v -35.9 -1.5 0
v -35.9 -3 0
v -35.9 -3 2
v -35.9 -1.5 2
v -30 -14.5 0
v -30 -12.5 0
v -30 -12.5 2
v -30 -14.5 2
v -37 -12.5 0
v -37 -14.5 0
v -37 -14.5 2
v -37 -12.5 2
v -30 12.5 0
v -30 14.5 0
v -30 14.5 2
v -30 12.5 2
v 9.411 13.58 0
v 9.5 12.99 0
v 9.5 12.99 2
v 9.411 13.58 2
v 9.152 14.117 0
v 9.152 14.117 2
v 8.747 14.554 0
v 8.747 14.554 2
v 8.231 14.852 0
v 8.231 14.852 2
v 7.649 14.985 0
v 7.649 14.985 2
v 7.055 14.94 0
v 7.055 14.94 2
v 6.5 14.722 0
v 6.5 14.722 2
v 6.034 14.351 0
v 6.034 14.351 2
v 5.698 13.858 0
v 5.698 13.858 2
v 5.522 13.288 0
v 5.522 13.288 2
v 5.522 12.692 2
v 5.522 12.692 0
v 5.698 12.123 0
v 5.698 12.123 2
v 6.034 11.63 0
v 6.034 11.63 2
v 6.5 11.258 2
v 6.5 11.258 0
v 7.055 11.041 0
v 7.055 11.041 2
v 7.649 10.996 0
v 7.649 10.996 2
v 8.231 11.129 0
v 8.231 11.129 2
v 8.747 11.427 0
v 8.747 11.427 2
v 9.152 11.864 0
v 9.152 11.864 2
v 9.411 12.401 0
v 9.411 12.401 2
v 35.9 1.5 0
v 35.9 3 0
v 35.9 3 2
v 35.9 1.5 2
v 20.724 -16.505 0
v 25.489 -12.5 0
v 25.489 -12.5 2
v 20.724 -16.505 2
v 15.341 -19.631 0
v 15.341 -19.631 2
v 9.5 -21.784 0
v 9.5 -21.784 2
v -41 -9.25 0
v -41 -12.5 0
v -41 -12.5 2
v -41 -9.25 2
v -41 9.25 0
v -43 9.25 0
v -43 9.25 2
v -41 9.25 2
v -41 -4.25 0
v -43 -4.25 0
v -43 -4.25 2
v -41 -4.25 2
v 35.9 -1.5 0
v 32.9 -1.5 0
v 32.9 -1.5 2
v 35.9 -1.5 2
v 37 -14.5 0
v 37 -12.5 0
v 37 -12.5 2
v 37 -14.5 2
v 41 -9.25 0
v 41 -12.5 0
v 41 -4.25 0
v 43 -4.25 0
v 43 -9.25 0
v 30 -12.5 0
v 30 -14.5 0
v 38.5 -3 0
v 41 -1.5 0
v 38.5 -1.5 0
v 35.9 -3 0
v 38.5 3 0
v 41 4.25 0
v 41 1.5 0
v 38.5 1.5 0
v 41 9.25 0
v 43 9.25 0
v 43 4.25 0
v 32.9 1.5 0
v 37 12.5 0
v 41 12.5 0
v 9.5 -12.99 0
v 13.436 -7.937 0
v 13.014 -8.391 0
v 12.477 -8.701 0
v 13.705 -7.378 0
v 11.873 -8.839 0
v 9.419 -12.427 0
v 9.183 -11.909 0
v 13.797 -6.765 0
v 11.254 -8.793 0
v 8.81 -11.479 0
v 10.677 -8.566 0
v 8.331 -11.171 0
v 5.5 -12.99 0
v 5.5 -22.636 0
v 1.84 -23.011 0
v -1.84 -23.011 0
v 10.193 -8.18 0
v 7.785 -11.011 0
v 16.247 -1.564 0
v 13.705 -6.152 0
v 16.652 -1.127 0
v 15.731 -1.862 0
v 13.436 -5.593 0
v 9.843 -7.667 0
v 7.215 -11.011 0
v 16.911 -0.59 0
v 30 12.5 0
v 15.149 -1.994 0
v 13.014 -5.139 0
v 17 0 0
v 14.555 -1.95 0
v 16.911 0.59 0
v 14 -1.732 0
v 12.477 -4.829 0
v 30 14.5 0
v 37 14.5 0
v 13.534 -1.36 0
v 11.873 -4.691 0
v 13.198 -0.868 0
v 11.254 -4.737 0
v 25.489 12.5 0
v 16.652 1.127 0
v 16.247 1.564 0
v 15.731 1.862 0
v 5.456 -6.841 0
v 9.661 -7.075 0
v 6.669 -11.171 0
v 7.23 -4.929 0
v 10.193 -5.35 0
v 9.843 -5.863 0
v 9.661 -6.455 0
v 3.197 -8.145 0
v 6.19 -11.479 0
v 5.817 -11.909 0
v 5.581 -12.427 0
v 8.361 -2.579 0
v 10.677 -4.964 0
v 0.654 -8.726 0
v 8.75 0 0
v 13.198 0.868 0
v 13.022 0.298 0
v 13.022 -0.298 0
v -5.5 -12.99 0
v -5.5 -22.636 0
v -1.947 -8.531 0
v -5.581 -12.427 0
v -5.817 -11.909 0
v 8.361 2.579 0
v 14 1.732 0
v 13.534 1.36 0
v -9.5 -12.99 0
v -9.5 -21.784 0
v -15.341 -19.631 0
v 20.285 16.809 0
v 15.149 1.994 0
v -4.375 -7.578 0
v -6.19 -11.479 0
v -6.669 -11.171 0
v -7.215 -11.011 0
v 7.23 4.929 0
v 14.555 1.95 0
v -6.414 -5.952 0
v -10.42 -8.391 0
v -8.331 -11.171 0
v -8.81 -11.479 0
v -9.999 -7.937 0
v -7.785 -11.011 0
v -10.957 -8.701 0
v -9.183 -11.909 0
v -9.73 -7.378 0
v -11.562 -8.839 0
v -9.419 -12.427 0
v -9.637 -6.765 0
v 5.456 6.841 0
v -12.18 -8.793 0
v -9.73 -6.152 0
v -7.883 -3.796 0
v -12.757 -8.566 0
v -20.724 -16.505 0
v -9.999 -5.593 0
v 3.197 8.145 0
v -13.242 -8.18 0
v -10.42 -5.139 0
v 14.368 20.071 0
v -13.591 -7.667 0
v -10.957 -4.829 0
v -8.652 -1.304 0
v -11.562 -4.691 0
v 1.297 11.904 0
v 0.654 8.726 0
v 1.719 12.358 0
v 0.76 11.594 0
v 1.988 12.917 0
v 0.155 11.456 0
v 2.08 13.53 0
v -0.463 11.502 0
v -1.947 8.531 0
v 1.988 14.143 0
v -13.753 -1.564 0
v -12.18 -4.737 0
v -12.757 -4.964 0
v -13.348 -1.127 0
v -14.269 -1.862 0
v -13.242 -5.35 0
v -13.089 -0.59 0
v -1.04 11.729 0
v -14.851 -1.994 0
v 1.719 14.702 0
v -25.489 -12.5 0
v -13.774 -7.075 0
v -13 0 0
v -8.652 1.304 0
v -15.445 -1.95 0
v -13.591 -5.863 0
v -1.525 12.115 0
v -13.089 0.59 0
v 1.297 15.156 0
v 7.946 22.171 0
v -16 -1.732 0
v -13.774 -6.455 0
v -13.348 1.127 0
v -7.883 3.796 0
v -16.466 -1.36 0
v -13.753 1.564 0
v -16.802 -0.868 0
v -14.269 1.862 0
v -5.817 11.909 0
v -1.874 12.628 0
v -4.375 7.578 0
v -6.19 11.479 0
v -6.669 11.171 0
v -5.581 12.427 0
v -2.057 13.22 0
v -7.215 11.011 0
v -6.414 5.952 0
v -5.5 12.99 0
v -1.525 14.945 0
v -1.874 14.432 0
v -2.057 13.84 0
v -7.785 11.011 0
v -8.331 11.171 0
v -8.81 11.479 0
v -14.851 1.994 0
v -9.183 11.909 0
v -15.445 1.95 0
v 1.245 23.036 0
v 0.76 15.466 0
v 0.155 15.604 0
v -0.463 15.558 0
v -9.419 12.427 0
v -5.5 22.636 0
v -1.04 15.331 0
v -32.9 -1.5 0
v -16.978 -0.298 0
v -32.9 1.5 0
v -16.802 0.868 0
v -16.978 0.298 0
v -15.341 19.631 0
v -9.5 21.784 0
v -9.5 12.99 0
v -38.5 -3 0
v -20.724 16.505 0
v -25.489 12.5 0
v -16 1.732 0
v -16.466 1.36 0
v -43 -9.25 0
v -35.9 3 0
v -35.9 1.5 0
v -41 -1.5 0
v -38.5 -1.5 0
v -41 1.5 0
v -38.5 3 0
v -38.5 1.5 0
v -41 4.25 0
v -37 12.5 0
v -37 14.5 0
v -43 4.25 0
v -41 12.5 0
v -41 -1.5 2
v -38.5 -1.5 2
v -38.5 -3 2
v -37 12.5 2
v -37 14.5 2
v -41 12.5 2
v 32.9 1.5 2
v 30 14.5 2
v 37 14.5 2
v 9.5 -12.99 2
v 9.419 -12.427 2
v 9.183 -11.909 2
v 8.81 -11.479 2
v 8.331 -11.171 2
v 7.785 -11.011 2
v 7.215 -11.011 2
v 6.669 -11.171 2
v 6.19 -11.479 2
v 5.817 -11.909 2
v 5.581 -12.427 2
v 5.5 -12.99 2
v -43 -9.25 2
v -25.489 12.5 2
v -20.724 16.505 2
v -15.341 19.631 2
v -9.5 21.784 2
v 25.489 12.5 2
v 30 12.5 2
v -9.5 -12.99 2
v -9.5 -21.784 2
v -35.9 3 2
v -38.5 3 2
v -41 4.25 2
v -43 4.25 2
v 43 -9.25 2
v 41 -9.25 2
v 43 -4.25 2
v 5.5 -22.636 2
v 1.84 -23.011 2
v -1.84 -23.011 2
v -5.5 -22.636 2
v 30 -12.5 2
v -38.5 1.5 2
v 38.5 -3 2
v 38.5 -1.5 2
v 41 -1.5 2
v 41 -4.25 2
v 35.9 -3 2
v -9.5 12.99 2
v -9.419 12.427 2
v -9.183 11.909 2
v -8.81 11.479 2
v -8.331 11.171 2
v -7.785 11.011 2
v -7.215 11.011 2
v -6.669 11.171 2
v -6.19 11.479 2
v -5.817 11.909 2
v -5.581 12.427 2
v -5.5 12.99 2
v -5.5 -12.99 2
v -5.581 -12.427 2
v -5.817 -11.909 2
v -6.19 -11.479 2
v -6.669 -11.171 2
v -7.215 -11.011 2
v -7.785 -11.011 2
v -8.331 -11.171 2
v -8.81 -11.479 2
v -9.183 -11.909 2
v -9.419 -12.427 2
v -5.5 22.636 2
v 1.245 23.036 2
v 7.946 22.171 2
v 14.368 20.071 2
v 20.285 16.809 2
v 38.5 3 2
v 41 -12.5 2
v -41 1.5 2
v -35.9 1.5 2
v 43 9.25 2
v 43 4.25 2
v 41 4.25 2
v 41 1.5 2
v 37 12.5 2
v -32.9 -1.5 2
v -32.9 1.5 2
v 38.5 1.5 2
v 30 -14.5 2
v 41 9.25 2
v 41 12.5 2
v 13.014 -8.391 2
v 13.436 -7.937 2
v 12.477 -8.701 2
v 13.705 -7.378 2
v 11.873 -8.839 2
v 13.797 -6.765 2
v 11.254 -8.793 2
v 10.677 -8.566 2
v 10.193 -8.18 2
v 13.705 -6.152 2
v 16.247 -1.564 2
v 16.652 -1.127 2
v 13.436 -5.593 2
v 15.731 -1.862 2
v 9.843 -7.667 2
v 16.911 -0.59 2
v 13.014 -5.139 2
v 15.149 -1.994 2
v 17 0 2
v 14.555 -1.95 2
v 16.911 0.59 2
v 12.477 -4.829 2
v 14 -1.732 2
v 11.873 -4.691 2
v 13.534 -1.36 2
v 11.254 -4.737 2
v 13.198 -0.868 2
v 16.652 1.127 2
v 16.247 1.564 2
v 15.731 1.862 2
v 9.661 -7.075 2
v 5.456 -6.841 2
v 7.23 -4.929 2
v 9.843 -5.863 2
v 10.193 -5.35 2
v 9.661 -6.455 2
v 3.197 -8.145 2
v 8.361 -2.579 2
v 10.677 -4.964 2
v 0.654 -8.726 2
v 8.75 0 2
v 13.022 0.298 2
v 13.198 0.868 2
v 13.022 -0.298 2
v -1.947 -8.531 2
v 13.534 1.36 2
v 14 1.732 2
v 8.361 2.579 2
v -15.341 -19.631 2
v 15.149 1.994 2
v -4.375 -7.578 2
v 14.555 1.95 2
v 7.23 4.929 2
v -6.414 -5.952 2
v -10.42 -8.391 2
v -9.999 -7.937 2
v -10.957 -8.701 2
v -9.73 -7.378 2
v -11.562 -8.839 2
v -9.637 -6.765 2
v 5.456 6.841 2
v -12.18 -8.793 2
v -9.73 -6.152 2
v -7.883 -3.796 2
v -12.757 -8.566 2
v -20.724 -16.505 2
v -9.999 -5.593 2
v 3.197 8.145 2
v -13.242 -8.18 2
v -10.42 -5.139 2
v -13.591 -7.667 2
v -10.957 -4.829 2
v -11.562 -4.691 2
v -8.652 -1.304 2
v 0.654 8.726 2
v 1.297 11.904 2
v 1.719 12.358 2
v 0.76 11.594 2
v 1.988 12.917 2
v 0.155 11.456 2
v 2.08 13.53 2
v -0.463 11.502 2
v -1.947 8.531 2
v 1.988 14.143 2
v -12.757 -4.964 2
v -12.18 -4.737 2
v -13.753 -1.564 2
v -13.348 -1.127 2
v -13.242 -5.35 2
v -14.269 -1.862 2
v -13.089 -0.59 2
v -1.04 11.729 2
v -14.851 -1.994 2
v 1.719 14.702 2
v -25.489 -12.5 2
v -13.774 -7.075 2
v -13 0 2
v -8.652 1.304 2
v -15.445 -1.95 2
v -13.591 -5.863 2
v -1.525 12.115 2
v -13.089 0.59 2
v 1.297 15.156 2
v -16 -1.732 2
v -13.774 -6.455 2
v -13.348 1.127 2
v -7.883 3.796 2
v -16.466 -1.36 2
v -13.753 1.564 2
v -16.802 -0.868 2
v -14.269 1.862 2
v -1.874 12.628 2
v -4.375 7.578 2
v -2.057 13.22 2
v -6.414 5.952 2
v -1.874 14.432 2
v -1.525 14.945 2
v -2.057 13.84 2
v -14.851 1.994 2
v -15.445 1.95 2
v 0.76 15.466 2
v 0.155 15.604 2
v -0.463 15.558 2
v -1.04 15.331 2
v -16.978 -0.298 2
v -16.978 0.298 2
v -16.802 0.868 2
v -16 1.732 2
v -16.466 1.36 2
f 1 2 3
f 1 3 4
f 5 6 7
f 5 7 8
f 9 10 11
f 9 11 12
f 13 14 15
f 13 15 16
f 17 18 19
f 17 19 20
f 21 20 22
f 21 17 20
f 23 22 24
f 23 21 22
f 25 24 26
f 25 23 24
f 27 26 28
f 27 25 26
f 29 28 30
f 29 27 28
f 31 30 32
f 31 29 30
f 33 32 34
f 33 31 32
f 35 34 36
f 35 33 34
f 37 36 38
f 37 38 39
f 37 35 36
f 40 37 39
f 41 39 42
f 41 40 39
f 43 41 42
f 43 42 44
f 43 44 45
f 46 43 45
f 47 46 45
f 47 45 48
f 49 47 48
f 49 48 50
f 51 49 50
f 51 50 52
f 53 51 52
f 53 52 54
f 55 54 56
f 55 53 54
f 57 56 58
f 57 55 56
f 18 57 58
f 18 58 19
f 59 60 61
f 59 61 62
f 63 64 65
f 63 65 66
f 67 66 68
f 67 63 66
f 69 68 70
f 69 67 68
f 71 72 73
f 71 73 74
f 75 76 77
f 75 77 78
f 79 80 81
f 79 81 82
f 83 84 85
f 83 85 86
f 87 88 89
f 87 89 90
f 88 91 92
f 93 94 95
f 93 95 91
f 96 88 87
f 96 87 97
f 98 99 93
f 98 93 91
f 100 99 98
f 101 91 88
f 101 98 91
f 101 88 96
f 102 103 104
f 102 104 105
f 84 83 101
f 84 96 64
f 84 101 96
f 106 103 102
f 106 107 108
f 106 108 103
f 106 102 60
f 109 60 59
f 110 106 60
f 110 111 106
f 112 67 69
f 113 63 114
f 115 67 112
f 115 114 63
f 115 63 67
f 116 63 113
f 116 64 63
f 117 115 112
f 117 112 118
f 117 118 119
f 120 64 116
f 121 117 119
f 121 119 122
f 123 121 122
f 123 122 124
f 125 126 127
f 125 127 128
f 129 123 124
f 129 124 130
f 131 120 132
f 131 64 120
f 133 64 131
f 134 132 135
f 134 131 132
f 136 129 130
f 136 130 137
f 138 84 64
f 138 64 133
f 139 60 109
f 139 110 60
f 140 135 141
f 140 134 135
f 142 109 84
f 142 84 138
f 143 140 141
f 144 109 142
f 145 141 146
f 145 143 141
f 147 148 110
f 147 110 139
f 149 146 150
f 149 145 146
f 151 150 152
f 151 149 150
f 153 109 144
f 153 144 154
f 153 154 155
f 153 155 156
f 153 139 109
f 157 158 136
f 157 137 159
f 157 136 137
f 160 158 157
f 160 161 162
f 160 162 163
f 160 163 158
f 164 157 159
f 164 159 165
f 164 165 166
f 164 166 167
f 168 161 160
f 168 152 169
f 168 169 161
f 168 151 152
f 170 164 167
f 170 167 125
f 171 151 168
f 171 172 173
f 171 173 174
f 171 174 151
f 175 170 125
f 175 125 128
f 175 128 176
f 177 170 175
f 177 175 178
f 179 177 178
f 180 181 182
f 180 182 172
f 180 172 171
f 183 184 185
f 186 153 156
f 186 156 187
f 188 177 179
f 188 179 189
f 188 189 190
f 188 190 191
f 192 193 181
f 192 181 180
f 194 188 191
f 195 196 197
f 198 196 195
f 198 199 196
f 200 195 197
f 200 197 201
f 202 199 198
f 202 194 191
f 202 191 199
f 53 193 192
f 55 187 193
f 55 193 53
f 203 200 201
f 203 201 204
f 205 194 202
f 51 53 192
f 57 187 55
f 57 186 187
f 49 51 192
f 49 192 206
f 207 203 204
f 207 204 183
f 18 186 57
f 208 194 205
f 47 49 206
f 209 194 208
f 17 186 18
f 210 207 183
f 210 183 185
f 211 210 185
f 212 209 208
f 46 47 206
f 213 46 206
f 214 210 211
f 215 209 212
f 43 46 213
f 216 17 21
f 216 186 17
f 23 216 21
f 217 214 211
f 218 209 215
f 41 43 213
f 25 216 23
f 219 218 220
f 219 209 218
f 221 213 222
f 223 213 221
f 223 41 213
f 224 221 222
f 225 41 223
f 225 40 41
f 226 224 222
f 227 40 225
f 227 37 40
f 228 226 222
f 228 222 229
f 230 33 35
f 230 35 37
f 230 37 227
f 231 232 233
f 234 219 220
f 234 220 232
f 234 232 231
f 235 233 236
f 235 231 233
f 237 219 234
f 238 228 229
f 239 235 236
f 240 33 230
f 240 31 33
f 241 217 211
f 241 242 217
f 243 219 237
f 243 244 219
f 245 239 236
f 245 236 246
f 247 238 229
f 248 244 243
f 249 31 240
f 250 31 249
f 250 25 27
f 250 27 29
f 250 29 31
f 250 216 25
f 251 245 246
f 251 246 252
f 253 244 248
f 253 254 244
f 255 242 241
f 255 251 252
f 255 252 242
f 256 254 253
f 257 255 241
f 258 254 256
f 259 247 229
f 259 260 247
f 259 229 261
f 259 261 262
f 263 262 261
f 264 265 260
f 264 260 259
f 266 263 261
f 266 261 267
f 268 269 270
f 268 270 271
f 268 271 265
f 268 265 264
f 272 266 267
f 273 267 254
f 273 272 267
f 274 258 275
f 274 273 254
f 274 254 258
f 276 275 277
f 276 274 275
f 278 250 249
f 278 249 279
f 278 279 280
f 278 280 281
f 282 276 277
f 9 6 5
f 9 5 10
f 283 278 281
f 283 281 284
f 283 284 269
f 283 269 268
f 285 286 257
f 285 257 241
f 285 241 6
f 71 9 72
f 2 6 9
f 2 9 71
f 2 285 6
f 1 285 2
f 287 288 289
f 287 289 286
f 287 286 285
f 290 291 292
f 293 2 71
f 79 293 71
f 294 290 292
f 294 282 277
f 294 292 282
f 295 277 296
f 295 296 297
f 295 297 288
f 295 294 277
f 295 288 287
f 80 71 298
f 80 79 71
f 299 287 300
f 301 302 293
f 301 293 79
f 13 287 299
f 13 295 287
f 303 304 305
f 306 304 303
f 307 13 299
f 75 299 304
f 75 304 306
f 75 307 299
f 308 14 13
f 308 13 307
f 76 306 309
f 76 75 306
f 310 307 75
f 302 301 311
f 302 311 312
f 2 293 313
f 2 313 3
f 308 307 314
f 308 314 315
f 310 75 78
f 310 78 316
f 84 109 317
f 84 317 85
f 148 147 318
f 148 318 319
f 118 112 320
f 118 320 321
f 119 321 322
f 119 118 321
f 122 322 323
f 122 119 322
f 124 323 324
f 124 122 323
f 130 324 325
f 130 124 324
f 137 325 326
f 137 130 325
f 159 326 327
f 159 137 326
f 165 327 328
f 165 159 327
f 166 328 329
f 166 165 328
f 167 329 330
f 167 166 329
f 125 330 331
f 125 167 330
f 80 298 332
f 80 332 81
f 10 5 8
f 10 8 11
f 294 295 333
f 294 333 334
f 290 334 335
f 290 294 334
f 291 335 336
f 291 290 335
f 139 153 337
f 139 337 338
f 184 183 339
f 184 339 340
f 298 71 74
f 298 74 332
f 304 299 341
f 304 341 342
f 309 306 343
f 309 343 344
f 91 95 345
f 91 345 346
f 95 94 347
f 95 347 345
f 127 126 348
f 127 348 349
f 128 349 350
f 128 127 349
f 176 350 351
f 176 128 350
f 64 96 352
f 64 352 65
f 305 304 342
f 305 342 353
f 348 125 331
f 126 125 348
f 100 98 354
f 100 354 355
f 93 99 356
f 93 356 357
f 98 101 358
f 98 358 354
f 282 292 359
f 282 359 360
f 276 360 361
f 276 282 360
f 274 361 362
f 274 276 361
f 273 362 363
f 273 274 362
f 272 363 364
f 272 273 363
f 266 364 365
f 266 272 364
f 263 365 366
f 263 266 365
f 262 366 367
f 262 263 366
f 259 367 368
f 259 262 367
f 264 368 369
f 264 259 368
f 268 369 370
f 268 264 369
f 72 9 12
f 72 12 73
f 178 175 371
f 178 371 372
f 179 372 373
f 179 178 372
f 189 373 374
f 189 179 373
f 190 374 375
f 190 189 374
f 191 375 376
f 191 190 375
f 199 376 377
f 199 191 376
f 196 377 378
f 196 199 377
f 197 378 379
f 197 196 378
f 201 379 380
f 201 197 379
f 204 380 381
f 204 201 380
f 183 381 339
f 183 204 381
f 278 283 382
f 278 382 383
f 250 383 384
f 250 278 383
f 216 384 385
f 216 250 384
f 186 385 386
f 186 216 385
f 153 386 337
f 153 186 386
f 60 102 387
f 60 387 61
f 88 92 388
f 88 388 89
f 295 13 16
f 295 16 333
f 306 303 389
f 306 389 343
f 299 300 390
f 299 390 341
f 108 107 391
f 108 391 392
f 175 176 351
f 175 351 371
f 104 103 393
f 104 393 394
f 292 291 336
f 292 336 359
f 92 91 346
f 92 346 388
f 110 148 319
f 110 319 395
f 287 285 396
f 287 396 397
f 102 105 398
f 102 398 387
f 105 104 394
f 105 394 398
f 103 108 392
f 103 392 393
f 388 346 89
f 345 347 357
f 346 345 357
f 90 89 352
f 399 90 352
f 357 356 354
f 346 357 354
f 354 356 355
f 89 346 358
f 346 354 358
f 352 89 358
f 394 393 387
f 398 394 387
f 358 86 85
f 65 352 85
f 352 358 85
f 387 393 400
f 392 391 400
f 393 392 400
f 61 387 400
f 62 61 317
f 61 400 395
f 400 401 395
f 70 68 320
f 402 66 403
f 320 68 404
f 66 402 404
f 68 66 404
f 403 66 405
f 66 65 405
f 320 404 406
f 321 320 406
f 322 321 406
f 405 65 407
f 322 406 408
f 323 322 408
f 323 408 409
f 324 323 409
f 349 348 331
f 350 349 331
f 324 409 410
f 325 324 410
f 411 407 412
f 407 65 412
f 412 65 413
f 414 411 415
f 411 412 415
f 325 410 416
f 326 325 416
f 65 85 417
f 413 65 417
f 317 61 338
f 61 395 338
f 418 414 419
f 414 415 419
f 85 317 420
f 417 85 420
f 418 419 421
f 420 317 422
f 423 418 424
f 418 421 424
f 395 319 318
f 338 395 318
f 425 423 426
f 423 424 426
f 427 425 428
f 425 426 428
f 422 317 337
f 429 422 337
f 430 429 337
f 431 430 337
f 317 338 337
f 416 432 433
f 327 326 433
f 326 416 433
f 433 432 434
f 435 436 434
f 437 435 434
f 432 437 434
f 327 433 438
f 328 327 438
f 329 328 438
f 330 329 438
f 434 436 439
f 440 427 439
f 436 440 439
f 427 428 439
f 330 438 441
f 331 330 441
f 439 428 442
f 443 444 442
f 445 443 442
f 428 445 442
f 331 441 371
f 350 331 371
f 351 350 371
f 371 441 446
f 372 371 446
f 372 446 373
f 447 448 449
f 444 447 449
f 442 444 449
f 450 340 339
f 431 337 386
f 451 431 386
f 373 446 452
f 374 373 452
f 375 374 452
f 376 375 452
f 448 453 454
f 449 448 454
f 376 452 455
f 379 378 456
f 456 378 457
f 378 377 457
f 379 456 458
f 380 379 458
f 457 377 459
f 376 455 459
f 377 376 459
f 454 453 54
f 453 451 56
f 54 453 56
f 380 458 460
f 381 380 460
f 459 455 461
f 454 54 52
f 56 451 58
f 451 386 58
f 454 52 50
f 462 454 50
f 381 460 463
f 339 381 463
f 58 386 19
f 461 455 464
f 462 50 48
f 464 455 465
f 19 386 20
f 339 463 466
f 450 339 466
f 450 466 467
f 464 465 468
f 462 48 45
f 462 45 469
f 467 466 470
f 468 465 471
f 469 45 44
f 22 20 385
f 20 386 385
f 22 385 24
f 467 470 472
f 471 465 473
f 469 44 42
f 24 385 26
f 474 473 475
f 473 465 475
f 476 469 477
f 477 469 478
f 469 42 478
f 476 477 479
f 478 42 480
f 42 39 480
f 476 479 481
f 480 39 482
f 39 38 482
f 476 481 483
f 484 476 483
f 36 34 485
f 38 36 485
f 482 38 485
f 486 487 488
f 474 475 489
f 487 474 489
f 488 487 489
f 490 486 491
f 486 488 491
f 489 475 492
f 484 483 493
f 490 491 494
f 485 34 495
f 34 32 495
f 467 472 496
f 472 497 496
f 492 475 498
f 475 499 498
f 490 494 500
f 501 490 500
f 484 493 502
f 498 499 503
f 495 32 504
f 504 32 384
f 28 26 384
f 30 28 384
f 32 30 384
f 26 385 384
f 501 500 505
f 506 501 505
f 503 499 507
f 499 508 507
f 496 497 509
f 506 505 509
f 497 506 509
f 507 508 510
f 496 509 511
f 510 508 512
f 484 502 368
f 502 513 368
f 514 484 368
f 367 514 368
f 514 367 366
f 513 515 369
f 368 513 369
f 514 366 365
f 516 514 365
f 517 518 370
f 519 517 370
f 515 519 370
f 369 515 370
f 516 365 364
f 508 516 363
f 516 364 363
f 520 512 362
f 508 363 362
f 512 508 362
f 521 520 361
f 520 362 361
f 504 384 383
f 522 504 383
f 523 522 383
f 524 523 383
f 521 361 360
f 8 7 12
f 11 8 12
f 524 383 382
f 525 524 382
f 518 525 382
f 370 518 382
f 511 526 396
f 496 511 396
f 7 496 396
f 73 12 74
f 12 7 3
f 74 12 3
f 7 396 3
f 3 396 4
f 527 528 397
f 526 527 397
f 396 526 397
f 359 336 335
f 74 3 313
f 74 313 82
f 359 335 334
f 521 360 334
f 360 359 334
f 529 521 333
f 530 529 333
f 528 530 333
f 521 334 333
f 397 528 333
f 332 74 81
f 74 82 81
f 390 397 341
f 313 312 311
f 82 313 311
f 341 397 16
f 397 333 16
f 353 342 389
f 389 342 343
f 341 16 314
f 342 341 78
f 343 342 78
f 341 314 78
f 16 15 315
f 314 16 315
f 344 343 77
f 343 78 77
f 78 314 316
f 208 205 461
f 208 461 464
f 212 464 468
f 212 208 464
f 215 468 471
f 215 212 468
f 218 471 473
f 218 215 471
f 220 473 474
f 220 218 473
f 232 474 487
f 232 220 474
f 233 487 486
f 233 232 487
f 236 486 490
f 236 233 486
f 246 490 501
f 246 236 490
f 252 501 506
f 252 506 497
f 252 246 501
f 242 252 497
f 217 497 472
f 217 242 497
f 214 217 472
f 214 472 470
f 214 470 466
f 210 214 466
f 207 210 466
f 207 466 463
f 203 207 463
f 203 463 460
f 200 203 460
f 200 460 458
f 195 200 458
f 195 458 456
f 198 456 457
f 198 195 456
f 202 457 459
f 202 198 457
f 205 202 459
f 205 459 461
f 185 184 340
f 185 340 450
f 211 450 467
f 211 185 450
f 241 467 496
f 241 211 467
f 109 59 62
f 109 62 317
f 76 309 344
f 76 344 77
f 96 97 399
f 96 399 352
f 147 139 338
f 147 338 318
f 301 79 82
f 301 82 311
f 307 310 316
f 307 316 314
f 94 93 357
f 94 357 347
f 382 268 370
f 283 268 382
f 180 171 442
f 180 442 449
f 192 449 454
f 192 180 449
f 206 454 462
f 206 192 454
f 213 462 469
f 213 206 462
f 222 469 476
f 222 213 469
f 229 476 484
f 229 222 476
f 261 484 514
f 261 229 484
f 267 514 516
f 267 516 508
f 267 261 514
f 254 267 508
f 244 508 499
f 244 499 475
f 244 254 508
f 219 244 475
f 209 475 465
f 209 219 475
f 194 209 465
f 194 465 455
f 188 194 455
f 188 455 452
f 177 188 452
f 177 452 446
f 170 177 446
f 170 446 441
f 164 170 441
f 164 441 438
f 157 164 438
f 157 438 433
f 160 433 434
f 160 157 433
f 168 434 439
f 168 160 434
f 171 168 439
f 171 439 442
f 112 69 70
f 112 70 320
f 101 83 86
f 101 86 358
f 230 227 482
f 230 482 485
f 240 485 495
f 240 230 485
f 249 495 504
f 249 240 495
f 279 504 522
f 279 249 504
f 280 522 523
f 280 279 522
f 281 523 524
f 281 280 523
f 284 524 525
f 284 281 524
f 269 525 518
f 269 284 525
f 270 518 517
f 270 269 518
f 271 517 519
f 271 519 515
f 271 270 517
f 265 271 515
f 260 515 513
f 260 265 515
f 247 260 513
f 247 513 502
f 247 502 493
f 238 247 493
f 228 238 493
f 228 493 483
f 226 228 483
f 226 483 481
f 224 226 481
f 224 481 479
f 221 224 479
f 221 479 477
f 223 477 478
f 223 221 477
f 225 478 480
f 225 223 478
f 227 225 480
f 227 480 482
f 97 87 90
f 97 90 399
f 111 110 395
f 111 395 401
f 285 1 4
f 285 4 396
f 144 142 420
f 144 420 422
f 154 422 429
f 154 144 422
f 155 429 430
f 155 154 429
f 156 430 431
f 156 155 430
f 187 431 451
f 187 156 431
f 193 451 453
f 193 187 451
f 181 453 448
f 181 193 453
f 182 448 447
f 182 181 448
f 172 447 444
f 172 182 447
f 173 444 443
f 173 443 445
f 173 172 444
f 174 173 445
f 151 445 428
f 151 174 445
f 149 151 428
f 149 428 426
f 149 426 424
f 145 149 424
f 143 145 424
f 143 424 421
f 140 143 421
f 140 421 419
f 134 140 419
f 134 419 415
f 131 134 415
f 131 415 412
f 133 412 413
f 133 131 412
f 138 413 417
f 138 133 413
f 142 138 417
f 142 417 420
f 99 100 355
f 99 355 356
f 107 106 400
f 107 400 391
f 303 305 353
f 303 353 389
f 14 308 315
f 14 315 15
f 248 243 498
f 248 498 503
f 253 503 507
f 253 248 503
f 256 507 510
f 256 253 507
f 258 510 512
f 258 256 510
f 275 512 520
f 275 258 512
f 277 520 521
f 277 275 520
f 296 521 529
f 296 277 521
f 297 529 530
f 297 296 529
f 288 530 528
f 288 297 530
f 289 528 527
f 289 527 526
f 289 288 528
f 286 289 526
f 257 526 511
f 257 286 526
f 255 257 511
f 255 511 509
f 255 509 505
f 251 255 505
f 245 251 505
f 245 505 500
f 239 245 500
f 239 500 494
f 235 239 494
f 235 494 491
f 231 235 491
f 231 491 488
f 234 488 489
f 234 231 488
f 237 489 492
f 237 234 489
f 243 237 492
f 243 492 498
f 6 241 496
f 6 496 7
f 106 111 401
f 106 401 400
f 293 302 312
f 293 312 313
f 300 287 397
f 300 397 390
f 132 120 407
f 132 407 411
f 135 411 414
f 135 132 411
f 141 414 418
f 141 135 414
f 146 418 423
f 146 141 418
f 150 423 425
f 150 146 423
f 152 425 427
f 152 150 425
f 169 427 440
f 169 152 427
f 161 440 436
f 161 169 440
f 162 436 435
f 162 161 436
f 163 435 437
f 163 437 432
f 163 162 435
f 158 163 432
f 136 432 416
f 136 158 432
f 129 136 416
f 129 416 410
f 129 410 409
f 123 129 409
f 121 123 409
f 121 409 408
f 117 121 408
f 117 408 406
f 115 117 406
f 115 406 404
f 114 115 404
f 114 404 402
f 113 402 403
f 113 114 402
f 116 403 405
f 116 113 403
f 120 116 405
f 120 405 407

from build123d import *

# Parameters (mm, degrees)
SKETCH_1_R      = 2
SKETCH_1_R_2    = 2.08
SKETCH_1_R_3    = 8.75
EXTRUDE_2_DEPTH = 2


with BuildPart() as part:
    # 草图1 → 凸台-拉伸2 (new body)
    with BuildSketch(Plane.XY):
        with BuildLine():
            Line((-41, 4.25), (-43, 4.25))
            Line((-43, 4.25), (-43, 9.25))
            Line((-43, 9.25), (-41, 9.25))
            Line((-41, 9.25), (-41, 12.5))
            Line((-41, 12.5), (-37, 12.5))
            Line((-37, 12.5), (-37, 14.5))
            Line((-37, 14.5), (-30, 14.5))
            Line((-30, 14.5), (-30, 12.5))
            Line((-30, 12.5), (-25.488968202, 12.5))
            ThreePointArc((-25.488968202, 12.5), (-18.099802413, 18.184292016), (-9.5, 21.783506545))
            Line((-9.5, 21.783506545), (-9.5, 12.990381057))
            ThreePointArc((-9.5, 12.990381057), (-7.5, 10.990381057), (-5.5, 12.990381057))
            Line((-5.5, 12.990381057), (-5.5, 22.635812499))
            ThreePointArc((-5.5, 22.635812499), (11.205953159, 21.271820081), (25.488968202, 12.5))
            Line((25.488968202, 12.5), (30, 12.5))
            Line((30, 12.5), (30, 14.5))
            Line((30, 14.5), (37, 14.5))
            Line((37, 14.5), (37, 12.5))
            Line((37, 12.5), (41, 12.5))
            Line((41, 12.5), (41, 9.25))
            Line((41, 9.25), (43, 9.25))
            Line((43, 9.25), (43, 4.25))
            Line((43, 4.25), (41, 4.25))
            Line((41, 4.25), (41, 1.5))
            Line((41, 1.5), (38.5, 1.5))
            Line((38.5, 1.5), (38.5, 3))
            Line((38.5, 3), (35.9, 3))
            Line((35.9, 3), (35.9, 1.5))
            Line((35.9, 1.5), (32.9, 1.5))
            Line((32.9, 1.5), (32.9, -1.5))
            Line((32.9, -1.5), (35.9, -1.5))
            Line((35.9, -1.5), (35.9, -3))
            Line((35.9, -3), (38.5, -3))
            Line((38.5, -3), (38.5, -1.5))
            Line((38.5, -1.5), (41, -1.5))
            Line((41, -1.5), (41, -4.25))
            Line((41, -4.25), (43, -4.25))
            Line((43, -4.25), (43, -9.25))
            Line((43, -9.25), (41, -9.25))
            Line((41, -9.25), (41, -12.5))
            Line((41, -12.5), (37, -12.5))
            Line((37, -12.5), (37, -14.5))
            Line((37, -14.5), (30, -14.5))
            Line((30, -14.5), (30, -12.5))
            Line((30, -12.5), (25.488968202, -12.5))
            ThreePointArc((25.488968202, -12.5), (18.099802413, -18.184292016), (9.5, -21.783506545))
            Line((9.5, -21.783506545), (9.5, -12.990381057))
            ThreePointArc((9.5, -12.990381057), (7.5, -10.990381057), (5.5, -12.990381057))
            Line((5.5, -12.990381057), (5.5, -22.635812499))
            ThreePointArc((5.5, -22.635812499), (0, -23.05787632), (-5.5, -22.635812499))
            Line((-5.5, -22.635812499), (-5.5, -12.990381057))
            ThreePointArc((-5.5, -12.990381057), (-7.5, -10.990381057), (-9.5, -12.990381057))
            Line((-9.5, -12.990381057), (-9.5, -21.783506545))
            ThreePointArc((-9.5, -21.783506545), (-18.099802413, -18.184292016), (-25.488968202, -12.5))
            Line((-25.488968202, -12.5), (-30, -12.5))
            Line((-30, -12.5), (-30, -14.5))
            Line((-30, -14.5), (-37, -14.5))
            Line((-37, -14.5), (-37, -12.5))
            Line((-37, -12.5), (-41, -12.5))
            Line((-41, -12.5), (-41, -9.25))
            Line((-41, -9.25), (-43, -9.25))
            Line((-43, -9.25), (-43, -4.25))
            Line((-43, -4.25), (-41, -4.25))
            Line((-41, -4.25), (-41, -1.5))
            Line((-41, -1.5), (-38.5, -1.5))
            Line((-38.5, -1.5), (-38.5, -3))
            Line((-38.5, -3), (-35.9, -3))
            Line((-35.9, -3), (-35.9, -1.5))
            Line((-35.9, -1.5), (-32.9, -1.5))
            Line((-32.9, -1.5), (-32.9, 1.5))
            Line((-32.9, 1.5), (-35.9, 1.5))
            Line((-35.9, 1.5), (-35.9, 3))
            Line((-35.9, 3), (-38.5, 3))
            Line((-38.5, 3), (-38.5, 1.5))
            Line((-38.5, 1.5), (-41, 1.5))
            Line((-41, 1.5), (-41, 4.25))
        make_face()
        with Locations((-15, 0)):
            Circle(SKETCH_1_R, mode=Mode.SUBTRACT)
        with Locations((7.5, 12.990381057)):
            Circle(SKETCH_1_R, mode=Mode.SUBTRACT)
        with Locations((15, 0)):
            Circle(SKETCH_1_R, mode=Mode.SUBTRACT)
        with Locations((0, 13.53)):
            Circle(SKETCH_1_R_2, mode=Mode.SUBTRACT)
        with Locations((11.717323713, -6.765)):
            Circle(SKETCH_1_R_2, mode=Mode.SUBTRACT)
        with Locations((-11.717323713, -6.765)):
            Circle(SKETCH_1_R_2, mode=Mode.SUBTRACT)
        Circle(SKETCH_1_R_3, mode=Mode.SUBTRACT)
    extrude(amount=EXTRUDE_2_DEPTH)


solid = part.part
